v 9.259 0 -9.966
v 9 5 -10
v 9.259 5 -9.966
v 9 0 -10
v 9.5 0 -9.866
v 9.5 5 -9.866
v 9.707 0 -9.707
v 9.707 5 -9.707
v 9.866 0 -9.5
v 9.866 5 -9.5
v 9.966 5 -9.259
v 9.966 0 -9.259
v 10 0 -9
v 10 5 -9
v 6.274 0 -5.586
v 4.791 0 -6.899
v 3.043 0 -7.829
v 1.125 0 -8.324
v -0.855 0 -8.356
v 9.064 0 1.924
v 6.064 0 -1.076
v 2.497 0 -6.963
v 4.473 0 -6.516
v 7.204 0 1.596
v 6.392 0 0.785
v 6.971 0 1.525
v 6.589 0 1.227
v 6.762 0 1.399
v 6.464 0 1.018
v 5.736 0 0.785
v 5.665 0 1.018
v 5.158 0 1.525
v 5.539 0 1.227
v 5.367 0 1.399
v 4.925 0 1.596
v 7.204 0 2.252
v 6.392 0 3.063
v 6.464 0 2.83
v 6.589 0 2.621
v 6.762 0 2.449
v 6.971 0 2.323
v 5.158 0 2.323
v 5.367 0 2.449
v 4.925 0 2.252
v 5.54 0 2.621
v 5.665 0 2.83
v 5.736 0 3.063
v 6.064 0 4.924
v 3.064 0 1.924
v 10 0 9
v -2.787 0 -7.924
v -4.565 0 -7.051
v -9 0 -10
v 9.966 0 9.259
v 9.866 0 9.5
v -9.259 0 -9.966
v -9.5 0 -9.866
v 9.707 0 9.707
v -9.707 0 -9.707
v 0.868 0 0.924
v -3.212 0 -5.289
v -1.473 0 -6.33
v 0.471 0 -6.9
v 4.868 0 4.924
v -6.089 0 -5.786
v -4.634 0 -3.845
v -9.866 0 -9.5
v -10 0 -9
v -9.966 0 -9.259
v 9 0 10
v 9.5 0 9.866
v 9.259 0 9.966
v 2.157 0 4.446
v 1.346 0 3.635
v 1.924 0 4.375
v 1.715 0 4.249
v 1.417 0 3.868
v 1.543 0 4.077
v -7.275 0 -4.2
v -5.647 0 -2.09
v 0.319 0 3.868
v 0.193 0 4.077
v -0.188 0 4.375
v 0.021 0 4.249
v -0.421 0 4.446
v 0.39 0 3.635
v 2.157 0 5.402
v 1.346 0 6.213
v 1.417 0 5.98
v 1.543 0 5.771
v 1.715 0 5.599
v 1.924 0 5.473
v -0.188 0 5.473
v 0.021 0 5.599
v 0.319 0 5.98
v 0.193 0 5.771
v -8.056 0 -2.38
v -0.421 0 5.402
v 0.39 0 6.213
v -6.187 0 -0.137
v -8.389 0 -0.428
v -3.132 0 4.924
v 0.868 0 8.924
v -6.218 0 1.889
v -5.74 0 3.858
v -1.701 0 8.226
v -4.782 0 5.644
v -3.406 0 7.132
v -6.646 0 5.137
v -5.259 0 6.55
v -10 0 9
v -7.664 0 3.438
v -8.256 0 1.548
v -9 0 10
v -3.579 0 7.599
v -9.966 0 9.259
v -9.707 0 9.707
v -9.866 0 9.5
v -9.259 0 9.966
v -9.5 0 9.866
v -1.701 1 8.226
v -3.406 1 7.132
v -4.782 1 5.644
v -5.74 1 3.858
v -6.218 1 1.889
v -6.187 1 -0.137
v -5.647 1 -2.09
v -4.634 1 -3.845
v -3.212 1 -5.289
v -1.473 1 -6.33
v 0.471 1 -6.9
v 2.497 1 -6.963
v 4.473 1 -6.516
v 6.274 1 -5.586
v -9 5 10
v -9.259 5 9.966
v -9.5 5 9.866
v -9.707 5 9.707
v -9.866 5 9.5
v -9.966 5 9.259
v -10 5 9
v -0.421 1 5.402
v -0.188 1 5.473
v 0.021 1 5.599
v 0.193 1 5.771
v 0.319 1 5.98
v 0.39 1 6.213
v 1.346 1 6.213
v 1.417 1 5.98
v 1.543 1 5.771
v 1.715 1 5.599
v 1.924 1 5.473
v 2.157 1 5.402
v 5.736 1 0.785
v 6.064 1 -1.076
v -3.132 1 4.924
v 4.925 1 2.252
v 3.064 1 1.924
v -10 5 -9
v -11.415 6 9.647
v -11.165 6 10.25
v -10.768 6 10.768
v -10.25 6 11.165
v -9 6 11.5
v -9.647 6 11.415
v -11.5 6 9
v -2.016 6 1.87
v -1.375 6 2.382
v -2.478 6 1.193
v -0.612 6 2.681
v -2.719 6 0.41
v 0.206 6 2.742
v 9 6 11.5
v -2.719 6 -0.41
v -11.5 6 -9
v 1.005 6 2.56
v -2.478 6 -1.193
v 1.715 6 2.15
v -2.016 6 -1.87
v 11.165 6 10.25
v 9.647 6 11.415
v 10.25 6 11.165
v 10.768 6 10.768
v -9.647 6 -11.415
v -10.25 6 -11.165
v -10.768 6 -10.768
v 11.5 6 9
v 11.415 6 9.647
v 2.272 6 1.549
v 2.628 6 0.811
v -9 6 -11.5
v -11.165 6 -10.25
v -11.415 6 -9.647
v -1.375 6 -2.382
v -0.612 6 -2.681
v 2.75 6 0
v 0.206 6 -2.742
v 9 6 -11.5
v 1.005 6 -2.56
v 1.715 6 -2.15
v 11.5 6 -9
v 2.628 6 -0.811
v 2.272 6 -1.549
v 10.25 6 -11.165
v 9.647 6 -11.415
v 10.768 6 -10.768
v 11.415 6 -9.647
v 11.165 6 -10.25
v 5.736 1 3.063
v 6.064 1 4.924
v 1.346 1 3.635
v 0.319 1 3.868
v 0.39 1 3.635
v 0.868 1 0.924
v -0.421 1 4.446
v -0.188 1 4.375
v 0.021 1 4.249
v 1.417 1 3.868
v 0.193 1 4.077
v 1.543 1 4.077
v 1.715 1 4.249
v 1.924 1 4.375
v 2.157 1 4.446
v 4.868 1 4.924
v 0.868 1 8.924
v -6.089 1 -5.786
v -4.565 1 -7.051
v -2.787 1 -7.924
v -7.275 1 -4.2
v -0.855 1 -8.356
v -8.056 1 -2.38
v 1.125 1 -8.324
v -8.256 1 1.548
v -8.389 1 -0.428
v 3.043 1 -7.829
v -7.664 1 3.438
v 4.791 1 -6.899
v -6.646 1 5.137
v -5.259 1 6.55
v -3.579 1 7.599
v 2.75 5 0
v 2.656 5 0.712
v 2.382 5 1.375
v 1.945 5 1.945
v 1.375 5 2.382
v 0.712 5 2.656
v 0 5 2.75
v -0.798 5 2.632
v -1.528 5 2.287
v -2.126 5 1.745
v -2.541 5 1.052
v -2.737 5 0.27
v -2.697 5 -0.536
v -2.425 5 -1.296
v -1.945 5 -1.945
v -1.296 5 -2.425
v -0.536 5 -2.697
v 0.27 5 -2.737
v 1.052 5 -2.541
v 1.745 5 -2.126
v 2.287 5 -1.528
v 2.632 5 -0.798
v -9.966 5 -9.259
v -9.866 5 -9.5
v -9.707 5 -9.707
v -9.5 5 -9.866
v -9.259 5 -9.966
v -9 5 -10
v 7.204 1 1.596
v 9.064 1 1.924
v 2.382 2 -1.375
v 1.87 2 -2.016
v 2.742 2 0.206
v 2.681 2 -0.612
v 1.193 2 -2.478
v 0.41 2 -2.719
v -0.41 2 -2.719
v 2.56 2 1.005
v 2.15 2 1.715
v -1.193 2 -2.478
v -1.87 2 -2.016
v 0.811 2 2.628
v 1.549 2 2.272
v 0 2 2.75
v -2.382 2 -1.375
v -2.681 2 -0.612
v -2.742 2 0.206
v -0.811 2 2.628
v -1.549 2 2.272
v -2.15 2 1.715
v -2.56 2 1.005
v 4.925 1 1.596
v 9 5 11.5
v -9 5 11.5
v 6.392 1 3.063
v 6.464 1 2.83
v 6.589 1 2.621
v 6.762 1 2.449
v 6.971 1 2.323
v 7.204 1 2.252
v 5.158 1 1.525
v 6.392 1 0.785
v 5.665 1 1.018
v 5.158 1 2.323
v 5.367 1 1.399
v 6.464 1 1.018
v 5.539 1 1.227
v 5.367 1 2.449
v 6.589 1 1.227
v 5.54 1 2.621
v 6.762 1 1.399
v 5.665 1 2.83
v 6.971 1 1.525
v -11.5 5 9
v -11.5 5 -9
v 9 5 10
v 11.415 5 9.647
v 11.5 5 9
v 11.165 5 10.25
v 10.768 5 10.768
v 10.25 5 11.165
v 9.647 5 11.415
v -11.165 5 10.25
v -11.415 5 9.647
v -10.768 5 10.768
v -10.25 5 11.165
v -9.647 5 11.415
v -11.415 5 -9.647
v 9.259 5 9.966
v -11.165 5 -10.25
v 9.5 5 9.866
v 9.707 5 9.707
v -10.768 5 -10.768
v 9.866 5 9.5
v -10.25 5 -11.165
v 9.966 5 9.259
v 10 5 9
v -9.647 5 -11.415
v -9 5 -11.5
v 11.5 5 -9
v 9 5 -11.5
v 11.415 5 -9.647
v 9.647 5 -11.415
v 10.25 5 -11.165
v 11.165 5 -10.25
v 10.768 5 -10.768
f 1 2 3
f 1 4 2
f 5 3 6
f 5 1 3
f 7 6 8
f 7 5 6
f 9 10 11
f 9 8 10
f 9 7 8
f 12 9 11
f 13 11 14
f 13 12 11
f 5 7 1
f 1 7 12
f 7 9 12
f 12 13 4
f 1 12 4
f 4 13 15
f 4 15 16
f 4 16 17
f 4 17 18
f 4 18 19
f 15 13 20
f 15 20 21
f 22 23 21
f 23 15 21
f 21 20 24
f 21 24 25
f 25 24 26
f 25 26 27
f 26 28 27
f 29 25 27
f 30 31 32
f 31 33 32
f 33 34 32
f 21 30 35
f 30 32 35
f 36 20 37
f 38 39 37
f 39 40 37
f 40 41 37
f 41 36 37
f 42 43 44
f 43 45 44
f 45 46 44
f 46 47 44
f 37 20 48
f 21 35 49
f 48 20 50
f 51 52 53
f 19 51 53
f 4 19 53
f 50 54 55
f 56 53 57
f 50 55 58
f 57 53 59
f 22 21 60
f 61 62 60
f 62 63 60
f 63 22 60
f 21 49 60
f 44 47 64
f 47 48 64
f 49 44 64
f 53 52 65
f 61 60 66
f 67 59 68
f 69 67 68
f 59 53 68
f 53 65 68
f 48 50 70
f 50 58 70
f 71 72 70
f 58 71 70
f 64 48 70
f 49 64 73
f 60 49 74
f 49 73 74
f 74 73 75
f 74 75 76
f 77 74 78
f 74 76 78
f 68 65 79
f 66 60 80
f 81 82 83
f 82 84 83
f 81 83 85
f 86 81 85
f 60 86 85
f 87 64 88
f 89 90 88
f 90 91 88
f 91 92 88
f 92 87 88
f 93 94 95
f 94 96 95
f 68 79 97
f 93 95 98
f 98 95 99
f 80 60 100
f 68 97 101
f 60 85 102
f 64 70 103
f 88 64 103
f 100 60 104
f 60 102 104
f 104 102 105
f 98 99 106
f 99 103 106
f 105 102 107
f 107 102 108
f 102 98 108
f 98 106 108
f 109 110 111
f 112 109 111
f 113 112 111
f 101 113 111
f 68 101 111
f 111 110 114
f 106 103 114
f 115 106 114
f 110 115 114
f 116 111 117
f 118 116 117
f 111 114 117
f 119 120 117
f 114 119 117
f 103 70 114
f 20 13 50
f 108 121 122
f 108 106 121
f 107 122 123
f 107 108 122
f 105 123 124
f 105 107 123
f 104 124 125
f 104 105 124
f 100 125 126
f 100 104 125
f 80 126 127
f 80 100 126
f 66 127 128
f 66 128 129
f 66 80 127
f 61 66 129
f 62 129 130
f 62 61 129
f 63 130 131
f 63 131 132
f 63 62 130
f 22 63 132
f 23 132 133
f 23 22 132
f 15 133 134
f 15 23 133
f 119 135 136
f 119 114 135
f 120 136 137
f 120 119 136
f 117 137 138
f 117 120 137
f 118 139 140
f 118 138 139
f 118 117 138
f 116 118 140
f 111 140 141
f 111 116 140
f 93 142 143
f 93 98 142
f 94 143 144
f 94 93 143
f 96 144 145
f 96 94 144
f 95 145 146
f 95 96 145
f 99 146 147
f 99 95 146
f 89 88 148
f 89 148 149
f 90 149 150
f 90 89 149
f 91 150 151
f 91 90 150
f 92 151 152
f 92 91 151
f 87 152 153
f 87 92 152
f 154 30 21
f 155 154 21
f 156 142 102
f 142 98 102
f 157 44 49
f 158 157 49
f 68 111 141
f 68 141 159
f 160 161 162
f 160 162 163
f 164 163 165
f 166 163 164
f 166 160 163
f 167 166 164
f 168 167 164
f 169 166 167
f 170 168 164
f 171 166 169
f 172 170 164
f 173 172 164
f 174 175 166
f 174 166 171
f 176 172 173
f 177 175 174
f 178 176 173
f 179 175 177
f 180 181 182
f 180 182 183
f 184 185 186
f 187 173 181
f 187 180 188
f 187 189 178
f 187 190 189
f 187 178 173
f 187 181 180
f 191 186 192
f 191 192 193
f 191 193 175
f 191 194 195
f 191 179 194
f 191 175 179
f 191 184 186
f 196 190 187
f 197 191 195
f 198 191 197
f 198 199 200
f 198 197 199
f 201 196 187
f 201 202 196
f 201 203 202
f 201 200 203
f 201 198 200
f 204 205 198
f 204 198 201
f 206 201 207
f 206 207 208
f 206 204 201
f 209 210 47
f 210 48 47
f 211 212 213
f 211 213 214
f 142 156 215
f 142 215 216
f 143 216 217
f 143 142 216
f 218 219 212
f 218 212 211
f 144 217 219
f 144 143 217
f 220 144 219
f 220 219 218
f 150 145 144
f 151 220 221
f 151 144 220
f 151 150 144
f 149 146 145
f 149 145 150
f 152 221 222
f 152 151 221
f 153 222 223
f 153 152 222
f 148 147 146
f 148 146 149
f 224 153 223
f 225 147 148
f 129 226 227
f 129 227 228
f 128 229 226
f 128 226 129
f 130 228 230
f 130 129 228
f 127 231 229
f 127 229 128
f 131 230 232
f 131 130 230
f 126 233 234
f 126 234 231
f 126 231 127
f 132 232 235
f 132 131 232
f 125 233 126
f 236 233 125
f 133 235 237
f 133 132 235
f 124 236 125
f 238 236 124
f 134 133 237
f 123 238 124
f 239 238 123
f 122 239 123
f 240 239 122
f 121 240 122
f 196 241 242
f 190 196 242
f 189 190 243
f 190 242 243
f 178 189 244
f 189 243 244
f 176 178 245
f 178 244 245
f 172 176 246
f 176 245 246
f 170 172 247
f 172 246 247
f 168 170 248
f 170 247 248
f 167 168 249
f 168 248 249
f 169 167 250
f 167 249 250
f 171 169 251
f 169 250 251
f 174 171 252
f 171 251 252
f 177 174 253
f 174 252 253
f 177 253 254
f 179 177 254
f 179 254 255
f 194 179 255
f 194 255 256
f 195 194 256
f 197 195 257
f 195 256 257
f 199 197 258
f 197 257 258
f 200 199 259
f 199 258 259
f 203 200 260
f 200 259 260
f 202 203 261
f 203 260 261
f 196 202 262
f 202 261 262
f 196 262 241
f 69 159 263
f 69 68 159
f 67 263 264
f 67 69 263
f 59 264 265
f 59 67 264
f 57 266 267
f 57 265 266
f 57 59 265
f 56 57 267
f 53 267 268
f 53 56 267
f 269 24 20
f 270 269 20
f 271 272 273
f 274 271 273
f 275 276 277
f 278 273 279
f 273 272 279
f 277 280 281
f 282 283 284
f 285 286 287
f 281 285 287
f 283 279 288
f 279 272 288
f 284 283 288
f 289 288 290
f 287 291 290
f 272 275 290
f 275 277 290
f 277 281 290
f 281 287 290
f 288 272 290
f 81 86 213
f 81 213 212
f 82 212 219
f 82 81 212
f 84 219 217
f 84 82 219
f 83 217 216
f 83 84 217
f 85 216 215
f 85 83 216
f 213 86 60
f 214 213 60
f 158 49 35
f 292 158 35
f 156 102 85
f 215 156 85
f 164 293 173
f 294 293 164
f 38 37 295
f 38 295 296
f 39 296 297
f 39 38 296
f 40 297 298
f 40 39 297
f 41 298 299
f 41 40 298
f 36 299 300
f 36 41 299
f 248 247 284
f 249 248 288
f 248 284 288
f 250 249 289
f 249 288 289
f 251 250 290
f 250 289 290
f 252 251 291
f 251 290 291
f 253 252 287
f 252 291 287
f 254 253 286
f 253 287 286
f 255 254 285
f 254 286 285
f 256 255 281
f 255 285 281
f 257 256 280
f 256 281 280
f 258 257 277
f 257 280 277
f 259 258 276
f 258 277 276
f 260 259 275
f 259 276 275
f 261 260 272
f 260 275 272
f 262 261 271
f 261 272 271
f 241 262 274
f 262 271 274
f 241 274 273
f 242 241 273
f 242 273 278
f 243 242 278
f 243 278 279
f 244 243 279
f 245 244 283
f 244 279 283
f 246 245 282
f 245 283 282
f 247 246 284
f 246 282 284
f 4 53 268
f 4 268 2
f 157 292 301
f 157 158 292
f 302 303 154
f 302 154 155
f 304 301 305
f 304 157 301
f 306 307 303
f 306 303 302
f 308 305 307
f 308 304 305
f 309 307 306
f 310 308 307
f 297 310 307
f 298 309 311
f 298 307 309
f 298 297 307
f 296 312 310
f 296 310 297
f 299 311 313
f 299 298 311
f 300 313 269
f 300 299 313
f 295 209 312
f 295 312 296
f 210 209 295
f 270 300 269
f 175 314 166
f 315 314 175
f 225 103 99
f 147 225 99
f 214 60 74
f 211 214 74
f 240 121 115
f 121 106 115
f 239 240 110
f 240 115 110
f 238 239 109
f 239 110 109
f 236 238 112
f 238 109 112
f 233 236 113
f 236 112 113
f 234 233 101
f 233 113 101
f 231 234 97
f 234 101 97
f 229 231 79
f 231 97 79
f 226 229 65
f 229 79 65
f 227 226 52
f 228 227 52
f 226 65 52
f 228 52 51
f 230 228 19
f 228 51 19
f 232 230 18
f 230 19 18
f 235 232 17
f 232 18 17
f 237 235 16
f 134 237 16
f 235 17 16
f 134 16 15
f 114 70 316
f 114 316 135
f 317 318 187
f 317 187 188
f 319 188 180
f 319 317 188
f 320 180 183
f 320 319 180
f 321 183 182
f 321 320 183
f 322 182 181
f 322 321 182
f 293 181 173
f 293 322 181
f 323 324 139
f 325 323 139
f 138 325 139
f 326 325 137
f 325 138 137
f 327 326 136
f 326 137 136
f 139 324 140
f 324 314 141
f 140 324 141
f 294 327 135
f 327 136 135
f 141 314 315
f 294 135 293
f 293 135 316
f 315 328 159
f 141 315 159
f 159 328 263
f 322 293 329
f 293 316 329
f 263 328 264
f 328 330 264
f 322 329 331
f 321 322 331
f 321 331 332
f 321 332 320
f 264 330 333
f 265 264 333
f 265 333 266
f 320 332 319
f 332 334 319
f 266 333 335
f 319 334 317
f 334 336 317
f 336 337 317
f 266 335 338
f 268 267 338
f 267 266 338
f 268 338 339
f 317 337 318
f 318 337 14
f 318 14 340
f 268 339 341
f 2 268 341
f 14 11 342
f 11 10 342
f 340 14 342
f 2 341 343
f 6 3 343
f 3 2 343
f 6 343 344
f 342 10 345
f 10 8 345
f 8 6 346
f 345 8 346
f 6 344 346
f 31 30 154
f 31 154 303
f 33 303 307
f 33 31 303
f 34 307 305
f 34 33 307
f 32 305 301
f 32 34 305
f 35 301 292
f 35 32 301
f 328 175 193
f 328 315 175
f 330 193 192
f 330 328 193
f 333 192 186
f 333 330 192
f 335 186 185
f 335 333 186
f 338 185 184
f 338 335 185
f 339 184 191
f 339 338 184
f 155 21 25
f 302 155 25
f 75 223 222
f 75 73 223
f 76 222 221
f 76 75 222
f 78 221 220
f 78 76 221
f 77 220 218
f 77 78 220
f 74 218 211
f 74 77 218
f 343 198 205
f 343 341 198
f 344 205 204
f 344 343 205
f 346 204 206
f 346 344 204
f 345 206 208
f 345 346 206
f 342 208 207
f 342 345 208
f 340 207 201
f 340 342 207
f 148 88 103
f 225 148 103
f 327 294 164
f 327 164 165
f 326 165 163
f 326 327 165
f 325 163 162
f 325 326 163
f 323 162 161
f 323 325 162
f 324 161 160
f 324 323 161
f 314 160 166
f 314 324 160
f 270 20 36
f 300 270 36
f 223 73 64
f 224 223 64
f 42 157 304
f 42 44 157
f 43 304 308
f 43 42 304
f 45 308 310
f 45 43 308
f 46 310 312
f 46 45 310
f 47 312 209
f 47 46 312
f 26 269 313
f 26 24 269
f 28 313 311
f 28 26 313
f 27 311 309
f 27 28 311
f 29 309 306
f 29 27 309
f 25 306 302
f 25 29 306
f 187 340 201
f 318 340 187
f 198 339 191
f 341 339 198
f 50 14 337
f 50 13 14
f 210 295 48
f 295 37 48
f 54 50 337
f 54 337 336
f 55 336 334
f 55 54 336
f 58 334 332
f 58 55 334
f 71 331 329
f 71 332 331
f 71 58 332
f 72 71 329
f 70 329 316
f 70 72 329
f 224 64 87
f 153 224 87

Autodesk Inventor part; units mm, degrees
ref_plane "YZ Plane" through (0, 0, 0) normal (1, 0, 0) x (0, 1, 0)
ref_plane "XZ Plane" through (0, 0, 0) normal (0, 1, 0) x (-1, 0, 0)
ref_plane "XY Plane" through (0, 0, 0) normal (0, 0, 1) x (1, 0, 0)
sketch "Sketch1" plane through (0, 0, 0) normal (0, 1, 0) x (-1, 0, 0)
  line L0 (9, -10) -> (-9, -10)
  line L1 (-10, -9) -> (-10, 9)
  line L2 (-9, 10) -> (9, 10)
  line L3 (10, 9) -> (10, -9)
  line L4 (10, 10) -> (-10, -10) construction
  line L5 (10, -10) -> (-10, 10) construction
  arc A0 (10, 9) -> (9, 10) centre (9, 9) ccw
  arc A1 (9, -10) -> (10, -9) centre (9, -9) ccw
  arc A2 (-10, -9) -> (-9, -10) centre (-9, -9) ccw
  arc A3 (-9, 10) -> (-10, 9) centre (-9, 9) ccw
  point P0 (0, 0)
  point P1 (0, 0)
  dimension "d7" = 20
  dimension "d9" = 20
  dimension "d10" = 1
extrude "Extrusion1" add sketch "Sketch1" along normal blind 5
sketch "Sketch2" plane through (0, 5, 0) normal (0, 1, 0) x (1, 0, 0)
  line L0 (-10, 9) -> (-10, -9) projected
  arc A0 (-10, -9) -> (-9, -10) centre (-9, -9) ccw projected
  line L1 (-9, -10) -> (9, -10) projected
  arc A1 (9, -10) -> (10, -9) centre (9, -9) ccw projected
  line L2 (10, -9) -> (10, 9) projected
  arc A2 (10, 9) -> (9, 10) centre (9, 9) ccw projected
  line L3 (9, 10) -> (-9, 10) projected
  arc A3 (-9, 10) -> (-10, 9) centre (-9, 9) ccw projected
  line L4 (9, -11.5) -> (-9, -11.5)
  arc A4 (-11.5, -9) -> (-9, -11.5) centre (-9, -9) ccw
  line L5 (-11.5, -9) -> (-11.5, 9)
  arc A5 (-9, 11.5) -> (-11.5, 9) centre (-9, 9) ccw
  line L6 (-9, 11.5) -> (9, 11.5)
  arc A6 (11.5, 9) -> (9, 11.5) centre (9, 9) ccw
  line L7 (11.5, 9) -> (11.5, -9)
  arc A7 (9, -11.5) -> (11.5, -9) centre (9, -9) ccw
  circle A8 centre (0, 0) radius 2.75
  dimension "d16" = 1.5
  dimension "d19" = 5.5
extrude "Extrusion3" add sketch "Sketch2" along normal blind 1 contours A3 L3 A2 L2 A1 L1 A0 L0 | L4 A4 L5 A5 L6 A6 L7 A7
sketch "Sketch3" plane through (0, 0, 0) normal (0, -1, 0) x (1, 0, 0)
  arc A0 (-1.7009, 8.226) -> (6.2735, -5.586) centre (1.7321, 1) ccw
  arc A1 (-1.7009, 8.226) -> (6.2735, -5.586) centre (0, 0) ccw
  line L0 (0, 0) -> (1.7321, 1) construction
  circle A2 centre (0, 0) radius 2.75 construction
  line L1 (0, 0) -> (9.8042, 0) construction
  line L2 (0.8682, 8.924) -> (0.3902, 6.2132)
  line L3 (0.3902, 3.6349) -> (0.8682, 0.924)
  line L4 (0.8682, 0.924) -> (1.3462, 3.6349)
  line L5 (1.3462, 6.2132) -> (0.8682, 8.924)
  line L6 (2.1574, 4.446) -> (4.8682, 4.924)
  line L7 (4.8682, 4.924) -> (2.1574, 5.402)
  line L8 (0.8682, 8.924) -> (0.8682, 0.924) construction
  line L9 (-3.1318, 4.924) -> (4.8682, 4.924) construction
  line L10 (-0.4209, 5.402) -> (-3.1318, 4.924)
  line L11 (-3.1318, 4.924) -> (-0.4209, 4.446)
  arc A3 (-0.4209, 5.402) -> (0.3902, 6.2132) centre (-0.5946, 6.3868) ccw
  arc A4 (1.3462, 6.2132) -> (2.1574, 5.402) centre (2.331, 6.3868) ccw
  arc A5 (2.1574, 4.446) -> (1.3462, 3.6349) centre (2.331, 3.4612) ccw
  arc A6 (0.3902, 3.6349) -> (-0.4209, 4.446) centre (-0.5946, 3.4612) ccw
  line L12 (6.0644, 4.924) -> (5.7363, 3.0633)
  line L13 (5.7363, 0.7848) -> (6.0644, -1.076)
  line L14 (6.0644, -1.076) -> (6.3925, 0.7848)
  line L15 (6.3925, 3.0633) -> (6.0644, 4.924)
  line L16 (7.2037, 1.5959) -> (9.0644, 1.924)
  line L17 (9.0644, 1.924) -> (7.2037, 2.2521)
  line L18 (6.0644, 4.924) -> (6.0644, -1.076) construction
  line L19 (3.0644, 1.924) -> (9.0644, 1.924) construction
  line L20 (4.9251, 2.2521) -> (3.0644, 1.924)
  line L21 (3.0644, 1.924) -> (4.9251, 1.5959)
  arc A7 (4.9251, 2.2521) -> (5.7363, 3.0633) centre (4.7515, 3.2369) ccw
  arc A8 (6.3925, 3.0633) -> (7.2037, 2.2521) centre (7.3773, 3.2369) ccw
  arc A9 (7.2037, 1.5959) -> (6.3925, 0.7848) centre (7.3773, 0.6111) ccw
  arc A10 (5.7363, 0.7848) -> (4.9251, 1.5959) centre (4.7515, 0.6111) ccw
  line L22 (0.8682, 4.924) -> (6.0644, 1.924) construction
  line L23 (0, 0) -> (0.8682, 4.924) construction
  dimension "d37" = 2
  dimension "d41" = 16
  dimension "d42" = 16.8
  dimension "d43" = 30
  dimension "d49" = 20
  dimension "d51" = 20
  dimension "d52" = 20
  dimension "d53" = 20
  dimension "d54" = 8
  dimension "d55" = 8
  dimension "d56" = 1
  dimension "d57" = 1
  dimension "d58" = 20
  dimension "d59" = 20
  dimension "d60" = 20
  dimension "d61" = 20
  dimension "d62" = 6
  dimension "d63" = 6
  dimension "d64" = 1
  dimension "d65" = 1
  dimension "d68" = 6
  dimension "d69" = 80
  dimension "d70" = 70
  dimension "d71" = 5
extrude "Extrusion5" cut sketch "Sketch3" against normal blind 1
hole "Hole1" at (0, 5, 0) direction (0, -1, 0) diameter 5.5 depth 3
equation "\"d7\" = button_side"
equation "\"d9\" = d7"
equation "\"d37\" = 0.1 * button_side"
equation "\"d41\" = 0.8 * button_side"
equation "\"d42\" = 1.05 * d41"
equation "\"d51\" = d49"
equation "\"d52\" = d49"
equation "\"d53\" = d49"
equation "\"d54\" = 0.4 * button_side"
equation "\"d55\" = d54"
equation "\"d59\" = d58"
equation "\"d60\" = d58"
equation "\"d61\" = d58"
equation "\"d62\" = 0.3 * button_side"
equation "\"d63\" = d62"
equation "\"d68\" = 0.3 * button_side"
equation "\"d0\" = 122"
equation "\"d1\" = 77"
equation "\"d4\" = 19"
equation "\"d5\" = 1"
equation "\"d8\" = 25"
equation "\"d13\" = 1.5"
equation "\"d14\" = 0"
equation "\"d15\" = 2"
equation "\"d30\" = 3.1"
equation "\"d31\" = 3"
equation "\"d33\" = 3"
equation "\"d34\" = 2"
equation "\"d36\" = 3"
equation "\"d38\" = 90deg"
equation "\"d39\" = 8"
equation "\"d40\" = 118deg"
equation "\"d44\" = 0"
equation "\"d45\" = 1.2"
equation "\"d46\" = 2"
equation "\"d47\" = 0"
equation "\"d50\" = 25"
equation "\"button_side\" = 20"
equation "\"d3\" = 1.01 * button_side"
equation "\"d2\" = d3"
properties part number "button2" material "Bronze, Soft Tin"
